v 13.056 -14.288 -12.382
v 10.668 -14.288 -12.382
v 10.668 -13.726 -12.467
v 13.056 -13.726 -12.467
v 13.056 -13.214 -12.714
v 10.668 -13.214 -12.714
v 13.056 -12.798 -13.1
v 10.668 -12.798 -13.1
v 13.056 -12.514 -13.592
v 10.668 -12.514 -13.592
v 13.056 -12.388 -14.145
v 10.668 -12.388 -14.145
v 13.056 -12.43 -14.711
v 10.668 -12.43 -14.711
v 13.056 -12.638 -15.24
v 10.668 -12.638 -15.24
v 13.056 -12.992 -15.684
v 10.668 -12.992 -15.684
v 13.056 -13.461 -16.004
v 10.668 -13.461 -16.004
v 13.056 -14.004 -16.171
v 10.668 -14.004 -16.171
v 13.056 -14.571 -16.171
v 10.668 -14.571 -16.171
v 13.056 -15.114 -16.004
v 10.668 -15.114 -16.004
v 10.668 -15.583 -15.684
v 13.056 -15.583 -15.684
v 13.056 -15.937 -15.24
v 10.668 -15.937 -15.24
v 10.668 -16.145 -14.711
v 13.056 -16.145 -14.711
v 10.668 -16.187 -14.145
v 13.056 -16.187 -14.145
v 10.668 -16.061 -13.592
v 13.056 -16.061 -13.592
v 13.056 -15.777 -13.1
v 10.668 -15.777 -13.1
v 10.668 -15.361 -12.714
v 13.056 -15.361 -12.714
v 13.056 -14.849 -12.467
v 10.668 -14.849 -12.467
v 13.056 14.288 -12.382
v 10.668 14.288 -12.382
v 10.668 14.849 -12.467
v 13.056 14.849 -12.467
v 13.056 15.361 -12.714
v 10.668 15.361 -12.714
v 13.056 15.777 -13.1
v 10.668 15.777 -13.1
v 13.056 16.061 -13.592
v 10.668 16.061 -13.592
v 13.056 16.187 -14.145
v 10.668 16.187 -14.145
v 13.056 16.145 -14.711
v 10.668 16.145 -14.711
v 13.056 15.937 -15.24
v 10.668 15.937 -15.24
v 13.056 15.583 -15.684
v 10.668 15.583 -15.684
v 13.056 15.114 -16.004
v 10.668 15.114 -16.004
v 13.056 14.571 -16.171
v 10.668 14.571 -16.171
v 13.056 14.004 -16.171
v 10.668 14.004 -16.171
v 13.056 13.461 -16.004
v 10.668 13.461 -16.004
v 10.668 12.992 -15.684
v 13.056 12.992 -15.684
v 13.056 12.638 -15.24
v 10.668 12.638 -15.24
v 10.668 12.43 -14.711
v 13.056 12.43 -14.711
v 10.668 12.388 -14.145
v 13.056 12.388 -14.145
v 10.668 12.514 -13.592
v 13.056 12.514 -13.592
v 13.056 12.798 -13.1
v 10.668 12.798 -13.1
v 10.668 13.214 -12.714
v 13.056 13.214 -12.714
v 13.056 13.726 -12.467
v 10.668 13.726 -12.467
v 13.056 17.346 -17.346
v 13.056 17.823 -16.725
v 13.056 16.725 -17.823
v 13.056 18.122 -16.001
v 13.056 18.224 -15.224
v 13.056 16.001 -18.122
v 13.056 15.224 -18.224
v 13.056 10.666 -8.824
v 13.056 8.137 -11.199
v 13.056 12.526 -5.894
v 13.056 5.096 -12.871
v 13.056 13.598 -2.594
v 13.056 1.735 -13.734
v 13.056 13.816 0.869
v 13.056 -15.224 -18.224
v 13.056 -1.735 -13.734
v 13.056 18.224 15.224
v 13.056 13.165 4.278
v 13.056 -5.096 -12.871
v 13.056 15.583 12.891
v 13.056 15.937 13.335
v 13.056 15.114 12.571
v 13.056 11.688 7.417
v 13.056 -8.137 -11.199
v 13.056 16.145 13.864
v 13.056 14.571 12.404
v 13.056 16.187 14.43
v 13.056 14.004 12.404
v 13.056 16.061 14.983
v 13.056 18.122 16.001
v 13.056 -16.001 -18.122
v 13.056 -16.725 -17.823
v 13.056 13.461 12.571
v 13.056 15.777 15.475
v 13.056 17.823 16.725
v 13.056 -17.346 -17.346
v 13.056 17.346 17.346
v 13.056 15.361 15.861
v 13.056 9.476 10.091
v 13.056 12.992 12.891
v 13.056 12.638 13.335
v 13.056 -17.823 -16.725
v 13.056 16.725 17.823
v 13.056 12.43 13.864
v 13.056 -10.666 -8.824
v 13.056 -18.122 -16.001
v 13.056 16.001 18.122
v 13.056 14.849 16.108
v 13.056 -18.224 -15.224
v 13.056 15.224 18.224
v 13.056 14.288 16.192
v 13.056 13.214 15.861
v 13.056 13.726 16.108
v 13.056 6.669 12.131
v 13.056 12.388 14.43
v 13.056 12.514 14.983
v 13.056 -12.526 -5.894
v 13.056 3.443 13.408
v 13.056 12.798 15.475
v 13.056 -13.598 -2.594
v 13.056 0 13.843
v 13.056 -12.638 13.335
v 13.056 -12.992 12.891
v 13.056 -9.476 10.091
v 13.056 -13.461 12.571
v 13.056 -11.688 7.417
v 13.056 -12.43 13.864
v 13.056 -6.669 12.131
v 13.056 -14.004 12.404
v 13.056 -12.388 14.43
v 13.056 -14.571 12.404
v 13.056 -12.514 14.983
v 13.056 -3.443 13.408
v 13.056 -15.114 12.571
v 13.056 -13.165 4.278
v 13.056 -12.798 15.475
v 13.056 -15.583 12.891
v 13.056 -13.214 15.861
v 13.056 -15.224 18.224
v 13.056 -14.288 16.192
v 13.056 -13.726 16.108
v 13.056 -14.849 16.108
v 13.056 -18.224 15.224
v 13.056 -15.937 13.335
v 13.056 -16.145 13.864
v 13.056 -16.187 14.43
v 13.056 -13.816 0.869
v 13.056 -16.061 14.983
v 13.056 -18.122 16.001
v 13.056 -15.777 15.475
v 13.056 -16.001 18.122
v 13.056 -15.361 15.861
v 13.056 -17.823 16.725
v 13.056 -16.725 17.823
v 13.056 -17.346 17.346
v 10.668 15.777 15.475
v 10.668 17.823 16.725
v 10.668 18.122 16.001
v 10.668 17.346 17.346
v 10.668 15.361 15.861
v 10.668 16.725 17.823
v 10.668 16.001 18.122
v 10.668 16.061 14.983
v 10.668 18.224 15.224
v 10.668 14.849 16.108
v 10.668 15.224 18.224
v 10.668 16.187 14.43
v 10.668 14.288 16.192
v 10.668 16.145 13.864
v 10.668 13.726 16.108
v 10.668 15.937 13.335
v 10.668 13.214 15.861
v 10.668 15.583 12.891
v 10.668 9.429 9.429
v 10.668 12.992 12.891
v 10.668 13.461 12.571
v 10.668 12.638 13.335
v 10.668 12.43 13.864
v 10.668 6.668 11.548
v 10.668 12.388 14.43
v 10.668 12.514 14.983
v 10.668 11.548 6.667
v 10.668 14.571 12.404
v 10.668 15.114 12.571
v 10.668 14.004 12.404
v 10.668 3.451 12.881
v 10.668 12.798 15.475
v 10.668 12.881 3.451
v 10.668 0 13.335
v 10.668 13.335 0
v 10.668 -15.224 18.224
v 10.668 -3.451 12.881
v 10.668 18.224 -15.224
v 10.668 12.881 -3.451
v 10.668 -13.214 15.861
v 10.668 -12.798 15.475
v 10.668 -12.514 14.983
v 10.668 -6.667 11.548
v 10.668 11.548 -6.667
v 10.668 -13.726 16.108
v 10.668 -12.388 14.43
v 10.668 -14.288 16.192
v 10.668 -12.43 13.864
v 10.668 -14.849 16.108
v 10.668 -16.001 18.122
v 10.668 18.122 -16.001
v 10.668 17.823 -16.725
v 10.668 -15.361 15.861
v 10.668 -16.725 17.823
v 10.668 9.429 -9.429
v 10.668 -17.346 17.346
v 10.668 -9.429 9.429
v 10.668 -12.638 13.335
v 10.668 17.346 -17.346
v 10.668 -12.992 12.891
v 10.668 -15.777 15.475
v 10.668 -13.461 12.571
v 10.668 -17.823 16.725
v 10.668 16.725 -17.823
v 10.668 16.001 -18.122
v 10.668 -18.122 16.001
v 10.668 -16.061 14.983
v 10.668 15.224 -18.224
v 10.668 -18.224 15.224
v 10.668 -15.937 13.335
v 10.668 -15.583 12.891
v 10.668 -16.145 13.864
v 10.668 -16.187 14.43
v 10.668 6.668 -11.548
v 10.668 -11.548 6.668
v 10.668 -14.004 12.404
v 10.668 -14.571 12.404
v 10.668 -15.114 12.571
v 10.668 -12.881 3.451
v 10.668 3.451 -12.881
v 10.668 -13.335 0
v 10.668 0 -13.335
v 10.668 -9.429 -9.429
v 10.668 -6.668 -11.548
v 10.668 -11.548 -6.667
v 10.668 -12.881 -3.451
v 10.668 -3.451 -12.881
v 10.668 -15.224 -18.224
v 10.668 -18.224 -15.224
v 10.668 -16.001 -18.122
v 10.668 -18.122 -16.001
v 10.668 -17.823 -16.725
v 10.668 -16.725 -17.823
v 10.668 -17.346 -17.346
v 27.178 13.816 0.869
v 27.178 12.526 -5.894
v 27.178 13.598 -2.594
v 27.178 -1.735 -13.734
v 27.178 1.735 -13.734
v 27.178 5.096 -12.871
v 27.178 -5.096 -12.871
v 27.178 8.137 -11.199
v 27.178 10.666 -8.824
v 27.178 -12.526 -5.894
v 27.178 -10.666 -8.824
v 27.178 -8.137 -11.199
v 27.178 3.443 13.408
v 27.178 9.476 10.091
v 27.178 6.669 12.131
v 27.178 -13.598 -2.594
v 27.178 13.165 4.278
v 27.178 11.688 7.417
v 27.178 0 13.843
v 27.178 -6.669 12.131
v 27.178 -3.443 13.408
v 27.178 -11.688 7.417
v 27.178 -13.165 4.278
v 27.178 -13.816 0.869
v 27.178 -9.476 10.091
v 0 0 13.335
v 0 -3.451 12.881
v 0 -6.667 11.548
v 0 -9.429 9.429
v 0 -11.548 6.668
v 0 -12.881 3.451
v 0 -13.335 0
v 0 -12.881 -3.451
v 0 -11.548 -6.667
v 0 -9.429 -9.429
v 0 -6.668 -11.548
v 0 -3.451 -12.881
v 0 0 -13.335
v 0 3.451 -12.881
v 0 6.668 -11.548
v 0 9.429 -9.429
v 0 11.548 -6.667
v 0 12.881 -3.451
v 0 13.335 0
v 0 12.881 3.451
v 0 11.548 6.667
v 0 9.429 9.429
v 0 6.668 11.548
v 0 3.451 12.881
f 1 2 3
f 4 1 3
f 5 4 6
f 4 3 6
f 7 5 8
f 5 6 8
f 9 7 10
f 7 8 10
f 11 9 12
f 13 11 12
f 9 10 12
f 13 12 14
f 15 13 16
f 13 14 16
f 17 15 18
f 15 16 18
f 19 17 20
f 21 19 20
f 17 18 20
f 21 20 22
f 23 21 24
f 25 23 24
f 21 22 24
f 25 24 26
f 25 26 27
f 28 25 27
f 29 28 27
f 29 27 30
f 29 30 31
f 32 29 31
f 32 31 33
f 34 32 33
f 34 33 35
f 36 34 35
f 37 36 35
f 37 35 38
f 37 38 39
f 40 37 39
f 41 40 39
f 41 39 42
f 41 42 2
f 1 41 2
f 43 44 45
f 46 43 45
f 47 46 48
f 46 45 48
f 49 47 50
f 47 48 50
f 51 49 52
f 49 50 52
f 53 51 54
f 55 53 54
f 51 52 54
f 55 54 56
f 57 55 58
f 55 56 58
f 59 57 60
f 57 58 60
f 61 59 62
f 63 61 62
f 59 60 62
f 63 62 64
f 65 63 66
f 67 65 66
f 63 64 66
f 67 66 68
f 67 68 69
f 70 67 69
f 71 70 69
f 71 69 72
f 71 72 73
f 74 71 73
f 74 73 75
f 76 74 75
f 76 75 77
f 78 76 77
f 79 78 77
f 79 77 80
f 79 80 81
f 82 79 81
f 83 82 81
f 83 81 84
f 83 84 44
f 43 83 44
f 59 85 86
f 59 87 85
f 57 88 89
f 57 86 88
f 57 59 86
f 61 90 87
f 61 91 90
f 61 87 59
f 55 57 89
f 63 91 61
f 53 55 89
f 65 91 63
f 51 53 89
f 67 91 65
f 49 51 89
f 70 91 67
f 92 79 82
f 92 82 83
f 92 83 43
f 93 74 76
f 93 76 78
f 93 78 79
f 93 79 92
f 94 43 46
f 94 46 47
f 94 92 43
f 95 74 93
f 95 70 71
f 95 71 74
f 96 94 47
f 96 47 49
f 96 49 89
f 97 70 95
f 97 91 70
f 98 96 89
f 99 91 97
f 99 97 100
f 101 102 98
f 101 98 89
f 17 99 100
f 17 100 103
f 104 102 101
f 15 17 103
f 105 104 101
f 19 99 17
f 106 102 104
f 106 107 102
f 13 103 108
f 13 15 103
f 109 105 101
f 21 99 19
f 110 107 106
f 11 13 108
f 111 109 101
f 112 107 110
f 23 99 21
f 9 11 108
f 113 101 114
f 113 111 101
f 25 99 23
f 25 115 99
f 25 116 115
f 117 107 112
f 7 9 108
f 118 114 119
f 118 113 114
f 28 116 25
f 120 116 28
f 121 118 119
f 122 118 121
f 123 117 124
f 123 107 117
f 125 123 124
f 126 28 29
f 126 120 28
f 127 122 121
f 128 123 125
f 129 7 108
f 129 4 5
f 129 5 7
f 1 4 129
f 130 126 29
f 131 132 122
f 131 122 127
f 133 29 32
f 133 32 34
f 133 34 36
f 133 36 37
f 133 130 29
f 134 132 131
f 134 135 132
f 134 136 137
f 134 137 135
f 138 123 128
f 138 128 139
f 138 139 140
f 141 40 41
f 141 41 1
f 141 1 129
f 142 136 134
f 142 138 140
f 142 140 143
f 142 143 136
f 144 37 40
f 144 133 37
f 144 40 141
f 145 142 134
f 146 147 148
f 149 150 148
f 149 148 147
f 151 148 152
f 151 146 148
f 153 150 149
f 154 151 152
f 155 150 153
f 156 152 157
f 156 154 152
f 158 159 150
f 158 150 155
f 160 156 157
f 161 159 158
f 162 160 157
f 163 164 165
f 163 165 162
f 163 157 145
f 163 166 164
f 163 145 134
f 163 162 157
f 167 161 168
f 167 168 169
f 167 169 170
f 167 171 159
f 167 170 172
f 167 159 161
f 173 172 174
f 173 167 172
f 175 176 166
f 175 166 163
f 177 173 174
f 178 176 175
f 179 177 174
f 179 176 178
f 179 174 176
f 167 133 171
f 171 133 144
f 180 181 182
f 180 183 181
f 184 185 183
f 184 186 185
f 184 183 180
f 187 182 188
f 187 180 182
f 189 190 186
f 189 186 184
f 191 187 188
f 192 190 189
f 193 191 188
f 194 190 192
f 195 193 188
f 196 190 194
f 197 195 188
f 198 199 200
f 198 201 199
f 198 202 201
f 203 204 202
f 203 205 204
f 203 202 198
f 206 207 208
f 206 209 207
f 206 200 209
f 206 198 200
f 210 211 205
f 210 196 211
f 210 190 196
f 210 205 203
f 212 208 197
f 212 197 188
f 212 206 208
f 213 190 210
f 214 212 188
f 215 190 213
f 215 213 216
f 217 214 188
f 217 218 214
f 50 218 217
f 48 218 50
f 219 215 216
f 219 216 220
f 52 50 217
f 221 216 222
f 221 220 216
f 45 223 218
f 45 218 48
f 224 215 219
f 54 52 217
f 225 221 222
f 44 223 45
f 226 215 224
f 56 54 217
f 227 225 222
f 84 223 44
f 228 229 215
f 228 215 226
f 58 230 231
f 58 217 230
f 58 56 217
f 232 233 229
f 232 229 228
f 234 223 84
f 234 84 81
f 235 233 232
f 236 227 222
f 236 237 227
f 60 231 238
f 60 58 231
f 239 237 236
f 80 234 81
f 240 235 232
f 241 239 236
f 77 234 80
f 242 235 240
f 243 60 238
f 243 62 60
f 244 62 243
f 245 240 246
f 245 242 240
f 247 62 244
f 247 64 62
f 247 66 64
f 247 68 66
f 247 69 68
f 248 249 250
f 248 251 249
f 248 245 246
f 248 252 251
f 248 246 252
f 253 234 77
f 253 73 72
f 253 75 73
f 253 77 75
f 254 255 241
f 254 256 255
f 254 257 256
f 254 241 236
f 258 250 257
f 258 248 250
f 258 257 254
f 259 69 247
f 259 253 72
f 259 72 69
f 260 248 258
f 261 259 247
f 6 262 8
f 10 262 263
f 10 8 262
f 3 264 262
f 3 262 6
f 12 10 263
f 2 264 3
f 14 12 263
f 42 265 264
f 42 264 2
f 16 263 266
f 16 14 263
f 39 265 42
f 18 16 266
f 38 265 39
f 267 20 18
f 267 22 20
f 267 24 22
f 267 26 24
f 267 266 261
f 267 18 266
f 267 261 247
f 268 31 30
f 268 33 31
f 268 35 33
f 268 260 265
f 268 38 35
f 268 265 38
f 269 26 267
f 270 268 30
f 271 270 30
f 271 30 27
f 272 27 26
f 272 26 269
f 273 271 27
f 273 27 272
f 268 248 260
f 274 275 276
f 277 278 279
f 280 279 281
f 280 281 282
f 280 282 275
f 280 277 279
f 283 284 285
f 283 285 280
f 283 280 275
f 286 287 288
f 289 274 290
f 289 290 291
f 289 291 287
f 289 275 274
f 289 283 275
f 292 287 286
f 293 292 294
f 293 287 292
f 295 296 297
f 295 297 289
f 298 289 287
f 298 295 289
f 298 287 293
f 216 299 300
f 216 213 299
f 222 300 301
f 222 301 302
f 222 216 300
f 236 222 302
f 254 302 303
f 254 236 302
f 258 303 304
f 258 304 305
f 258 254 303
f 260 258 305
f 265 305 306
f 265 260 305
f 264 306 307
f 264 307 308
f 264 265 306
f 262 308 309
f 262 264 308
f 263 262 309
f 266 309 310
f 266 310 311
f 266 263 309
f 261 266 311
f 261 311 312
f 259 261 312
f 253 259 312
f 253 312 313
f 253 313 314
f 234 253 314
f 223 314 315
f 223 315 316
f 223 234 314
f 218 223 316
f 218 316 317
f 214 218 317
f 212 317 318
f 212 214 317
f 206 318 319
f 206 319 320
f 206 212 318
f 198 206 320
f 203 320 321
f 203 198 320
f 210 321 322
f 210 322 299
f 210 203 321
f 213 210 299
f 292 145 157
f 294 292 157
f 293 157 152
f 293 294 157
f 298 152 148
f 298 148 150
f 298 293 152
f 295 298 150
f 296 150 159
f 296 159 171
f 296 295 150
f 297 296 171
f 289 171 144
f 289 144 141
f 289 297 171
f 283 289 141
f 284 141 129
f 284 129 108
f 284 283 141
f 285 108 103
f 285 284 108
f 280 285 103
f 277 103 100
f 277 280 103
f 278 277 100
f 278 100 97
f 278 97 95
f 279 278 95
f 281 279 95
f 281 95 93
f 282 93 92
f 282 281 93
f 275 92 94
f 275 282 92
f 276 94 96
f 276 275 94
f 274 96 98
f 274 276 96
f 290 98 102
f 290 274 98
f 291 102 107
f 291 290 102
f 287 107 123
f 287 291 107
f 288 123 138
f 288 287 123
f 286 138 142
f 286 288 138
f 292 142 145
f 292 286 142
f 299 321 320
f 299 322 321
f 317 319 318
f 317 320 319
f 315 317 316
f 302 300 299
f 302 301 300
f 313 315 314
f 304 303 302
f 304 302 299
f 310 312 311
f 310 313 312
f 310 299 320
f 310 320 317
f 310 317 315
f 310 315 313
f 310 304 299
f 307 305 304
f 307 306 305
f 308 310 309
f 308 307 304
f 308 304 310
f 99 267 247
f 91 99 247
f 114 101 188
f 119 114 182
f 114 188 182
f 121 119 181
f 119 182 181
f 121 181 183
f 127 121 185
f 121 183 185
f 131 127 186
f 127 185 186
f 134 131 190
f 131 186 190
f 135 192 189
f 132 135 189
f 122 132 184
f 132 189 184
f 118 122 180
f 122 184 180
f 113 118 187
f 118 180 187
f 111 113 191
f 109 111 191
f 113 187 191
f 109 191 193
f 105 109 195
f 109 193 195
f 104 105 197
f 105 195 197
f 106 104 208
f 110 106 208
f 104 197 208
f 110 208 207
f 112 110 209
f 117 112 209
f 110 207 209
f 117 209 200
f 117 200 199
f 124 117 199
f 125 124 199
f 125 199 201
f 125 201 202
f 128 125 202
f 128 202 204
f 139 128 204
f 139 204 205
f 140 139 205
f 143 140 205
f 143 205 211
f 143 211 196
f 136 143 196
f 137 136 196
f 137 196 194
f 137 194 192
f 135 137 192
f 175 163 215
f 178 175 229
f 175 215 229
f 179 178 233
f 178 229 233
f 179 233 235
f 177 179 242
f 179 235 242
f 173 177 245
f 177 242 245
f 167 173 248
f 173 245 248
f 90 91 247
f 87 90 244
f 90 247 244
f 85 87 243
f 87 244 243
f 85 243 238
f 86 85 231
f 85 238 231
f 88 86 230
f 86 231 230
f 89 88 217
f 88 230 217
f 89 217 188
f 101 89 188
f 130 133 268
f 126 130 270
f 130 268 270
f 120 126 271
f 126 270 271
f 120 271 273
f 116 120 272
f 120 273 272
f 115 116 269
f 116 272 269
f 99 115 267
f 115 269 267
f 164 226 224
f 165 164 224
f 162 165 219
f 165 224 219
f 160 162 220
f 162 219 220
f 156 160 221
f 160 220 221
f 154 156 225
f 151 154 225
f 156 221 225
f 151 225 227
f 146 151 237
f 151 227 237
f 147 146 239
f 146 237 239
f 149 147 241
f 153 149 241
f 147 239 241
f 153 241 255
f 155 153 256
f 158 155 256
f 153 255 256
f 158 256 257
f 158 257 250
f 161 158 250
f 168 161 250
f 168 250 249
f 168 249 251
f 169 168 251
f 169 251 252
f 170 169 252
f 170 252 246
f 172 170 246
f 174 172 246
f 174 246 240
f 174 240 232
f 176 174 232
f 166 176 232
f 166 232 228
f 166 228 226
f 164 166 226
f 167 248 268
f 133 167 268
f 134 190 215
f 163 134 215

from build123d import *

# Parameters (mm, degrees)
SKETCH2_OUTSIDE_W  = 79.82
SKETCH2_OUTSIDE_H  = 79.82
SKETCH2_OUTSIDE_R  = 1.905
CUT_EXTRUDE1_DEPTH = 17.51


with BuildPart() as part:
    # Sketch1 → Revolve1 (revolve)
    with BuildSketch(Plane.XY, mode=Mode.PRIVATE) as revolve1_sk:
        Polygon((0, 0), (0, 13.335), (10.668, 13.335), (10.668, 30), (13.0556, 30), (13.0556, 13.843), (27.178, 13.843), (27.178, 0), align=None)
    revolve(revolve1_sk.sketch.rotate(Axis((0, 0, 0), (1, 0, 0)), 90), axis=Axis((0, 0, 0), (1, 0, 0)))  # turned: the seam where the file's is

    # Sketch2 outside → Cut-Extrude1 (cut, through all)
    with BuildSketch(Plane.ZY.offset(-10.668)):
        Rectangle(SKETCH2_OUTSIDE_W, SKETCH2_OUTSIDE_H)
        with BuildLine():
            Line((-15.2245, 18.2245), (15.2245, 18.2245))
            ThreePointArc((15.2245, 18.2245), (17.345820344, 17.345820344), (18.2245, 15.2245))
            Line((18.2245, 15.2245), (18.2245, -15.2245))
            ThreePointArc((18.2245, -15.2245), (17.345820344, -17.345820344), (15.2245, -18.2245))
            Line((15.2245, -18.2245), (-15.2245, -18.2245))
            ThreePointArc((-15.2245, -18.2245), (-17.345820344, -17.345820344), (-18.2245, -15.2245))
            Line((-18.2245, -15.2245), (-18.2245, 15.2245))
            ThreePointArc((-18.2245, 15.2245), (-17.345820344, 17.345820344), (-15.2245, 18.2245))
        make_face(mode=Mode.SUBTRACT)
        with Locations((14.2875, 14.2875)):
            Circle(SKETCH2_OUTSIDE_R)
        with Locations((-14.2875, 14.2875)):
            Circle(SKETCH2_OUTSIDE_R)
        with Locations((-14.2875, -14.2875)):
            Circle(SKETCH2_OUTSIDE_R)
        with Locations((14.2875, -14.2875)):
            Circle(SKETCH2_OUTSIDE_R)
    extrude(amount=-CUT_EXTRUDE1_DEPTH, mode=Mode.SUBTRACT)


solid = part.part
